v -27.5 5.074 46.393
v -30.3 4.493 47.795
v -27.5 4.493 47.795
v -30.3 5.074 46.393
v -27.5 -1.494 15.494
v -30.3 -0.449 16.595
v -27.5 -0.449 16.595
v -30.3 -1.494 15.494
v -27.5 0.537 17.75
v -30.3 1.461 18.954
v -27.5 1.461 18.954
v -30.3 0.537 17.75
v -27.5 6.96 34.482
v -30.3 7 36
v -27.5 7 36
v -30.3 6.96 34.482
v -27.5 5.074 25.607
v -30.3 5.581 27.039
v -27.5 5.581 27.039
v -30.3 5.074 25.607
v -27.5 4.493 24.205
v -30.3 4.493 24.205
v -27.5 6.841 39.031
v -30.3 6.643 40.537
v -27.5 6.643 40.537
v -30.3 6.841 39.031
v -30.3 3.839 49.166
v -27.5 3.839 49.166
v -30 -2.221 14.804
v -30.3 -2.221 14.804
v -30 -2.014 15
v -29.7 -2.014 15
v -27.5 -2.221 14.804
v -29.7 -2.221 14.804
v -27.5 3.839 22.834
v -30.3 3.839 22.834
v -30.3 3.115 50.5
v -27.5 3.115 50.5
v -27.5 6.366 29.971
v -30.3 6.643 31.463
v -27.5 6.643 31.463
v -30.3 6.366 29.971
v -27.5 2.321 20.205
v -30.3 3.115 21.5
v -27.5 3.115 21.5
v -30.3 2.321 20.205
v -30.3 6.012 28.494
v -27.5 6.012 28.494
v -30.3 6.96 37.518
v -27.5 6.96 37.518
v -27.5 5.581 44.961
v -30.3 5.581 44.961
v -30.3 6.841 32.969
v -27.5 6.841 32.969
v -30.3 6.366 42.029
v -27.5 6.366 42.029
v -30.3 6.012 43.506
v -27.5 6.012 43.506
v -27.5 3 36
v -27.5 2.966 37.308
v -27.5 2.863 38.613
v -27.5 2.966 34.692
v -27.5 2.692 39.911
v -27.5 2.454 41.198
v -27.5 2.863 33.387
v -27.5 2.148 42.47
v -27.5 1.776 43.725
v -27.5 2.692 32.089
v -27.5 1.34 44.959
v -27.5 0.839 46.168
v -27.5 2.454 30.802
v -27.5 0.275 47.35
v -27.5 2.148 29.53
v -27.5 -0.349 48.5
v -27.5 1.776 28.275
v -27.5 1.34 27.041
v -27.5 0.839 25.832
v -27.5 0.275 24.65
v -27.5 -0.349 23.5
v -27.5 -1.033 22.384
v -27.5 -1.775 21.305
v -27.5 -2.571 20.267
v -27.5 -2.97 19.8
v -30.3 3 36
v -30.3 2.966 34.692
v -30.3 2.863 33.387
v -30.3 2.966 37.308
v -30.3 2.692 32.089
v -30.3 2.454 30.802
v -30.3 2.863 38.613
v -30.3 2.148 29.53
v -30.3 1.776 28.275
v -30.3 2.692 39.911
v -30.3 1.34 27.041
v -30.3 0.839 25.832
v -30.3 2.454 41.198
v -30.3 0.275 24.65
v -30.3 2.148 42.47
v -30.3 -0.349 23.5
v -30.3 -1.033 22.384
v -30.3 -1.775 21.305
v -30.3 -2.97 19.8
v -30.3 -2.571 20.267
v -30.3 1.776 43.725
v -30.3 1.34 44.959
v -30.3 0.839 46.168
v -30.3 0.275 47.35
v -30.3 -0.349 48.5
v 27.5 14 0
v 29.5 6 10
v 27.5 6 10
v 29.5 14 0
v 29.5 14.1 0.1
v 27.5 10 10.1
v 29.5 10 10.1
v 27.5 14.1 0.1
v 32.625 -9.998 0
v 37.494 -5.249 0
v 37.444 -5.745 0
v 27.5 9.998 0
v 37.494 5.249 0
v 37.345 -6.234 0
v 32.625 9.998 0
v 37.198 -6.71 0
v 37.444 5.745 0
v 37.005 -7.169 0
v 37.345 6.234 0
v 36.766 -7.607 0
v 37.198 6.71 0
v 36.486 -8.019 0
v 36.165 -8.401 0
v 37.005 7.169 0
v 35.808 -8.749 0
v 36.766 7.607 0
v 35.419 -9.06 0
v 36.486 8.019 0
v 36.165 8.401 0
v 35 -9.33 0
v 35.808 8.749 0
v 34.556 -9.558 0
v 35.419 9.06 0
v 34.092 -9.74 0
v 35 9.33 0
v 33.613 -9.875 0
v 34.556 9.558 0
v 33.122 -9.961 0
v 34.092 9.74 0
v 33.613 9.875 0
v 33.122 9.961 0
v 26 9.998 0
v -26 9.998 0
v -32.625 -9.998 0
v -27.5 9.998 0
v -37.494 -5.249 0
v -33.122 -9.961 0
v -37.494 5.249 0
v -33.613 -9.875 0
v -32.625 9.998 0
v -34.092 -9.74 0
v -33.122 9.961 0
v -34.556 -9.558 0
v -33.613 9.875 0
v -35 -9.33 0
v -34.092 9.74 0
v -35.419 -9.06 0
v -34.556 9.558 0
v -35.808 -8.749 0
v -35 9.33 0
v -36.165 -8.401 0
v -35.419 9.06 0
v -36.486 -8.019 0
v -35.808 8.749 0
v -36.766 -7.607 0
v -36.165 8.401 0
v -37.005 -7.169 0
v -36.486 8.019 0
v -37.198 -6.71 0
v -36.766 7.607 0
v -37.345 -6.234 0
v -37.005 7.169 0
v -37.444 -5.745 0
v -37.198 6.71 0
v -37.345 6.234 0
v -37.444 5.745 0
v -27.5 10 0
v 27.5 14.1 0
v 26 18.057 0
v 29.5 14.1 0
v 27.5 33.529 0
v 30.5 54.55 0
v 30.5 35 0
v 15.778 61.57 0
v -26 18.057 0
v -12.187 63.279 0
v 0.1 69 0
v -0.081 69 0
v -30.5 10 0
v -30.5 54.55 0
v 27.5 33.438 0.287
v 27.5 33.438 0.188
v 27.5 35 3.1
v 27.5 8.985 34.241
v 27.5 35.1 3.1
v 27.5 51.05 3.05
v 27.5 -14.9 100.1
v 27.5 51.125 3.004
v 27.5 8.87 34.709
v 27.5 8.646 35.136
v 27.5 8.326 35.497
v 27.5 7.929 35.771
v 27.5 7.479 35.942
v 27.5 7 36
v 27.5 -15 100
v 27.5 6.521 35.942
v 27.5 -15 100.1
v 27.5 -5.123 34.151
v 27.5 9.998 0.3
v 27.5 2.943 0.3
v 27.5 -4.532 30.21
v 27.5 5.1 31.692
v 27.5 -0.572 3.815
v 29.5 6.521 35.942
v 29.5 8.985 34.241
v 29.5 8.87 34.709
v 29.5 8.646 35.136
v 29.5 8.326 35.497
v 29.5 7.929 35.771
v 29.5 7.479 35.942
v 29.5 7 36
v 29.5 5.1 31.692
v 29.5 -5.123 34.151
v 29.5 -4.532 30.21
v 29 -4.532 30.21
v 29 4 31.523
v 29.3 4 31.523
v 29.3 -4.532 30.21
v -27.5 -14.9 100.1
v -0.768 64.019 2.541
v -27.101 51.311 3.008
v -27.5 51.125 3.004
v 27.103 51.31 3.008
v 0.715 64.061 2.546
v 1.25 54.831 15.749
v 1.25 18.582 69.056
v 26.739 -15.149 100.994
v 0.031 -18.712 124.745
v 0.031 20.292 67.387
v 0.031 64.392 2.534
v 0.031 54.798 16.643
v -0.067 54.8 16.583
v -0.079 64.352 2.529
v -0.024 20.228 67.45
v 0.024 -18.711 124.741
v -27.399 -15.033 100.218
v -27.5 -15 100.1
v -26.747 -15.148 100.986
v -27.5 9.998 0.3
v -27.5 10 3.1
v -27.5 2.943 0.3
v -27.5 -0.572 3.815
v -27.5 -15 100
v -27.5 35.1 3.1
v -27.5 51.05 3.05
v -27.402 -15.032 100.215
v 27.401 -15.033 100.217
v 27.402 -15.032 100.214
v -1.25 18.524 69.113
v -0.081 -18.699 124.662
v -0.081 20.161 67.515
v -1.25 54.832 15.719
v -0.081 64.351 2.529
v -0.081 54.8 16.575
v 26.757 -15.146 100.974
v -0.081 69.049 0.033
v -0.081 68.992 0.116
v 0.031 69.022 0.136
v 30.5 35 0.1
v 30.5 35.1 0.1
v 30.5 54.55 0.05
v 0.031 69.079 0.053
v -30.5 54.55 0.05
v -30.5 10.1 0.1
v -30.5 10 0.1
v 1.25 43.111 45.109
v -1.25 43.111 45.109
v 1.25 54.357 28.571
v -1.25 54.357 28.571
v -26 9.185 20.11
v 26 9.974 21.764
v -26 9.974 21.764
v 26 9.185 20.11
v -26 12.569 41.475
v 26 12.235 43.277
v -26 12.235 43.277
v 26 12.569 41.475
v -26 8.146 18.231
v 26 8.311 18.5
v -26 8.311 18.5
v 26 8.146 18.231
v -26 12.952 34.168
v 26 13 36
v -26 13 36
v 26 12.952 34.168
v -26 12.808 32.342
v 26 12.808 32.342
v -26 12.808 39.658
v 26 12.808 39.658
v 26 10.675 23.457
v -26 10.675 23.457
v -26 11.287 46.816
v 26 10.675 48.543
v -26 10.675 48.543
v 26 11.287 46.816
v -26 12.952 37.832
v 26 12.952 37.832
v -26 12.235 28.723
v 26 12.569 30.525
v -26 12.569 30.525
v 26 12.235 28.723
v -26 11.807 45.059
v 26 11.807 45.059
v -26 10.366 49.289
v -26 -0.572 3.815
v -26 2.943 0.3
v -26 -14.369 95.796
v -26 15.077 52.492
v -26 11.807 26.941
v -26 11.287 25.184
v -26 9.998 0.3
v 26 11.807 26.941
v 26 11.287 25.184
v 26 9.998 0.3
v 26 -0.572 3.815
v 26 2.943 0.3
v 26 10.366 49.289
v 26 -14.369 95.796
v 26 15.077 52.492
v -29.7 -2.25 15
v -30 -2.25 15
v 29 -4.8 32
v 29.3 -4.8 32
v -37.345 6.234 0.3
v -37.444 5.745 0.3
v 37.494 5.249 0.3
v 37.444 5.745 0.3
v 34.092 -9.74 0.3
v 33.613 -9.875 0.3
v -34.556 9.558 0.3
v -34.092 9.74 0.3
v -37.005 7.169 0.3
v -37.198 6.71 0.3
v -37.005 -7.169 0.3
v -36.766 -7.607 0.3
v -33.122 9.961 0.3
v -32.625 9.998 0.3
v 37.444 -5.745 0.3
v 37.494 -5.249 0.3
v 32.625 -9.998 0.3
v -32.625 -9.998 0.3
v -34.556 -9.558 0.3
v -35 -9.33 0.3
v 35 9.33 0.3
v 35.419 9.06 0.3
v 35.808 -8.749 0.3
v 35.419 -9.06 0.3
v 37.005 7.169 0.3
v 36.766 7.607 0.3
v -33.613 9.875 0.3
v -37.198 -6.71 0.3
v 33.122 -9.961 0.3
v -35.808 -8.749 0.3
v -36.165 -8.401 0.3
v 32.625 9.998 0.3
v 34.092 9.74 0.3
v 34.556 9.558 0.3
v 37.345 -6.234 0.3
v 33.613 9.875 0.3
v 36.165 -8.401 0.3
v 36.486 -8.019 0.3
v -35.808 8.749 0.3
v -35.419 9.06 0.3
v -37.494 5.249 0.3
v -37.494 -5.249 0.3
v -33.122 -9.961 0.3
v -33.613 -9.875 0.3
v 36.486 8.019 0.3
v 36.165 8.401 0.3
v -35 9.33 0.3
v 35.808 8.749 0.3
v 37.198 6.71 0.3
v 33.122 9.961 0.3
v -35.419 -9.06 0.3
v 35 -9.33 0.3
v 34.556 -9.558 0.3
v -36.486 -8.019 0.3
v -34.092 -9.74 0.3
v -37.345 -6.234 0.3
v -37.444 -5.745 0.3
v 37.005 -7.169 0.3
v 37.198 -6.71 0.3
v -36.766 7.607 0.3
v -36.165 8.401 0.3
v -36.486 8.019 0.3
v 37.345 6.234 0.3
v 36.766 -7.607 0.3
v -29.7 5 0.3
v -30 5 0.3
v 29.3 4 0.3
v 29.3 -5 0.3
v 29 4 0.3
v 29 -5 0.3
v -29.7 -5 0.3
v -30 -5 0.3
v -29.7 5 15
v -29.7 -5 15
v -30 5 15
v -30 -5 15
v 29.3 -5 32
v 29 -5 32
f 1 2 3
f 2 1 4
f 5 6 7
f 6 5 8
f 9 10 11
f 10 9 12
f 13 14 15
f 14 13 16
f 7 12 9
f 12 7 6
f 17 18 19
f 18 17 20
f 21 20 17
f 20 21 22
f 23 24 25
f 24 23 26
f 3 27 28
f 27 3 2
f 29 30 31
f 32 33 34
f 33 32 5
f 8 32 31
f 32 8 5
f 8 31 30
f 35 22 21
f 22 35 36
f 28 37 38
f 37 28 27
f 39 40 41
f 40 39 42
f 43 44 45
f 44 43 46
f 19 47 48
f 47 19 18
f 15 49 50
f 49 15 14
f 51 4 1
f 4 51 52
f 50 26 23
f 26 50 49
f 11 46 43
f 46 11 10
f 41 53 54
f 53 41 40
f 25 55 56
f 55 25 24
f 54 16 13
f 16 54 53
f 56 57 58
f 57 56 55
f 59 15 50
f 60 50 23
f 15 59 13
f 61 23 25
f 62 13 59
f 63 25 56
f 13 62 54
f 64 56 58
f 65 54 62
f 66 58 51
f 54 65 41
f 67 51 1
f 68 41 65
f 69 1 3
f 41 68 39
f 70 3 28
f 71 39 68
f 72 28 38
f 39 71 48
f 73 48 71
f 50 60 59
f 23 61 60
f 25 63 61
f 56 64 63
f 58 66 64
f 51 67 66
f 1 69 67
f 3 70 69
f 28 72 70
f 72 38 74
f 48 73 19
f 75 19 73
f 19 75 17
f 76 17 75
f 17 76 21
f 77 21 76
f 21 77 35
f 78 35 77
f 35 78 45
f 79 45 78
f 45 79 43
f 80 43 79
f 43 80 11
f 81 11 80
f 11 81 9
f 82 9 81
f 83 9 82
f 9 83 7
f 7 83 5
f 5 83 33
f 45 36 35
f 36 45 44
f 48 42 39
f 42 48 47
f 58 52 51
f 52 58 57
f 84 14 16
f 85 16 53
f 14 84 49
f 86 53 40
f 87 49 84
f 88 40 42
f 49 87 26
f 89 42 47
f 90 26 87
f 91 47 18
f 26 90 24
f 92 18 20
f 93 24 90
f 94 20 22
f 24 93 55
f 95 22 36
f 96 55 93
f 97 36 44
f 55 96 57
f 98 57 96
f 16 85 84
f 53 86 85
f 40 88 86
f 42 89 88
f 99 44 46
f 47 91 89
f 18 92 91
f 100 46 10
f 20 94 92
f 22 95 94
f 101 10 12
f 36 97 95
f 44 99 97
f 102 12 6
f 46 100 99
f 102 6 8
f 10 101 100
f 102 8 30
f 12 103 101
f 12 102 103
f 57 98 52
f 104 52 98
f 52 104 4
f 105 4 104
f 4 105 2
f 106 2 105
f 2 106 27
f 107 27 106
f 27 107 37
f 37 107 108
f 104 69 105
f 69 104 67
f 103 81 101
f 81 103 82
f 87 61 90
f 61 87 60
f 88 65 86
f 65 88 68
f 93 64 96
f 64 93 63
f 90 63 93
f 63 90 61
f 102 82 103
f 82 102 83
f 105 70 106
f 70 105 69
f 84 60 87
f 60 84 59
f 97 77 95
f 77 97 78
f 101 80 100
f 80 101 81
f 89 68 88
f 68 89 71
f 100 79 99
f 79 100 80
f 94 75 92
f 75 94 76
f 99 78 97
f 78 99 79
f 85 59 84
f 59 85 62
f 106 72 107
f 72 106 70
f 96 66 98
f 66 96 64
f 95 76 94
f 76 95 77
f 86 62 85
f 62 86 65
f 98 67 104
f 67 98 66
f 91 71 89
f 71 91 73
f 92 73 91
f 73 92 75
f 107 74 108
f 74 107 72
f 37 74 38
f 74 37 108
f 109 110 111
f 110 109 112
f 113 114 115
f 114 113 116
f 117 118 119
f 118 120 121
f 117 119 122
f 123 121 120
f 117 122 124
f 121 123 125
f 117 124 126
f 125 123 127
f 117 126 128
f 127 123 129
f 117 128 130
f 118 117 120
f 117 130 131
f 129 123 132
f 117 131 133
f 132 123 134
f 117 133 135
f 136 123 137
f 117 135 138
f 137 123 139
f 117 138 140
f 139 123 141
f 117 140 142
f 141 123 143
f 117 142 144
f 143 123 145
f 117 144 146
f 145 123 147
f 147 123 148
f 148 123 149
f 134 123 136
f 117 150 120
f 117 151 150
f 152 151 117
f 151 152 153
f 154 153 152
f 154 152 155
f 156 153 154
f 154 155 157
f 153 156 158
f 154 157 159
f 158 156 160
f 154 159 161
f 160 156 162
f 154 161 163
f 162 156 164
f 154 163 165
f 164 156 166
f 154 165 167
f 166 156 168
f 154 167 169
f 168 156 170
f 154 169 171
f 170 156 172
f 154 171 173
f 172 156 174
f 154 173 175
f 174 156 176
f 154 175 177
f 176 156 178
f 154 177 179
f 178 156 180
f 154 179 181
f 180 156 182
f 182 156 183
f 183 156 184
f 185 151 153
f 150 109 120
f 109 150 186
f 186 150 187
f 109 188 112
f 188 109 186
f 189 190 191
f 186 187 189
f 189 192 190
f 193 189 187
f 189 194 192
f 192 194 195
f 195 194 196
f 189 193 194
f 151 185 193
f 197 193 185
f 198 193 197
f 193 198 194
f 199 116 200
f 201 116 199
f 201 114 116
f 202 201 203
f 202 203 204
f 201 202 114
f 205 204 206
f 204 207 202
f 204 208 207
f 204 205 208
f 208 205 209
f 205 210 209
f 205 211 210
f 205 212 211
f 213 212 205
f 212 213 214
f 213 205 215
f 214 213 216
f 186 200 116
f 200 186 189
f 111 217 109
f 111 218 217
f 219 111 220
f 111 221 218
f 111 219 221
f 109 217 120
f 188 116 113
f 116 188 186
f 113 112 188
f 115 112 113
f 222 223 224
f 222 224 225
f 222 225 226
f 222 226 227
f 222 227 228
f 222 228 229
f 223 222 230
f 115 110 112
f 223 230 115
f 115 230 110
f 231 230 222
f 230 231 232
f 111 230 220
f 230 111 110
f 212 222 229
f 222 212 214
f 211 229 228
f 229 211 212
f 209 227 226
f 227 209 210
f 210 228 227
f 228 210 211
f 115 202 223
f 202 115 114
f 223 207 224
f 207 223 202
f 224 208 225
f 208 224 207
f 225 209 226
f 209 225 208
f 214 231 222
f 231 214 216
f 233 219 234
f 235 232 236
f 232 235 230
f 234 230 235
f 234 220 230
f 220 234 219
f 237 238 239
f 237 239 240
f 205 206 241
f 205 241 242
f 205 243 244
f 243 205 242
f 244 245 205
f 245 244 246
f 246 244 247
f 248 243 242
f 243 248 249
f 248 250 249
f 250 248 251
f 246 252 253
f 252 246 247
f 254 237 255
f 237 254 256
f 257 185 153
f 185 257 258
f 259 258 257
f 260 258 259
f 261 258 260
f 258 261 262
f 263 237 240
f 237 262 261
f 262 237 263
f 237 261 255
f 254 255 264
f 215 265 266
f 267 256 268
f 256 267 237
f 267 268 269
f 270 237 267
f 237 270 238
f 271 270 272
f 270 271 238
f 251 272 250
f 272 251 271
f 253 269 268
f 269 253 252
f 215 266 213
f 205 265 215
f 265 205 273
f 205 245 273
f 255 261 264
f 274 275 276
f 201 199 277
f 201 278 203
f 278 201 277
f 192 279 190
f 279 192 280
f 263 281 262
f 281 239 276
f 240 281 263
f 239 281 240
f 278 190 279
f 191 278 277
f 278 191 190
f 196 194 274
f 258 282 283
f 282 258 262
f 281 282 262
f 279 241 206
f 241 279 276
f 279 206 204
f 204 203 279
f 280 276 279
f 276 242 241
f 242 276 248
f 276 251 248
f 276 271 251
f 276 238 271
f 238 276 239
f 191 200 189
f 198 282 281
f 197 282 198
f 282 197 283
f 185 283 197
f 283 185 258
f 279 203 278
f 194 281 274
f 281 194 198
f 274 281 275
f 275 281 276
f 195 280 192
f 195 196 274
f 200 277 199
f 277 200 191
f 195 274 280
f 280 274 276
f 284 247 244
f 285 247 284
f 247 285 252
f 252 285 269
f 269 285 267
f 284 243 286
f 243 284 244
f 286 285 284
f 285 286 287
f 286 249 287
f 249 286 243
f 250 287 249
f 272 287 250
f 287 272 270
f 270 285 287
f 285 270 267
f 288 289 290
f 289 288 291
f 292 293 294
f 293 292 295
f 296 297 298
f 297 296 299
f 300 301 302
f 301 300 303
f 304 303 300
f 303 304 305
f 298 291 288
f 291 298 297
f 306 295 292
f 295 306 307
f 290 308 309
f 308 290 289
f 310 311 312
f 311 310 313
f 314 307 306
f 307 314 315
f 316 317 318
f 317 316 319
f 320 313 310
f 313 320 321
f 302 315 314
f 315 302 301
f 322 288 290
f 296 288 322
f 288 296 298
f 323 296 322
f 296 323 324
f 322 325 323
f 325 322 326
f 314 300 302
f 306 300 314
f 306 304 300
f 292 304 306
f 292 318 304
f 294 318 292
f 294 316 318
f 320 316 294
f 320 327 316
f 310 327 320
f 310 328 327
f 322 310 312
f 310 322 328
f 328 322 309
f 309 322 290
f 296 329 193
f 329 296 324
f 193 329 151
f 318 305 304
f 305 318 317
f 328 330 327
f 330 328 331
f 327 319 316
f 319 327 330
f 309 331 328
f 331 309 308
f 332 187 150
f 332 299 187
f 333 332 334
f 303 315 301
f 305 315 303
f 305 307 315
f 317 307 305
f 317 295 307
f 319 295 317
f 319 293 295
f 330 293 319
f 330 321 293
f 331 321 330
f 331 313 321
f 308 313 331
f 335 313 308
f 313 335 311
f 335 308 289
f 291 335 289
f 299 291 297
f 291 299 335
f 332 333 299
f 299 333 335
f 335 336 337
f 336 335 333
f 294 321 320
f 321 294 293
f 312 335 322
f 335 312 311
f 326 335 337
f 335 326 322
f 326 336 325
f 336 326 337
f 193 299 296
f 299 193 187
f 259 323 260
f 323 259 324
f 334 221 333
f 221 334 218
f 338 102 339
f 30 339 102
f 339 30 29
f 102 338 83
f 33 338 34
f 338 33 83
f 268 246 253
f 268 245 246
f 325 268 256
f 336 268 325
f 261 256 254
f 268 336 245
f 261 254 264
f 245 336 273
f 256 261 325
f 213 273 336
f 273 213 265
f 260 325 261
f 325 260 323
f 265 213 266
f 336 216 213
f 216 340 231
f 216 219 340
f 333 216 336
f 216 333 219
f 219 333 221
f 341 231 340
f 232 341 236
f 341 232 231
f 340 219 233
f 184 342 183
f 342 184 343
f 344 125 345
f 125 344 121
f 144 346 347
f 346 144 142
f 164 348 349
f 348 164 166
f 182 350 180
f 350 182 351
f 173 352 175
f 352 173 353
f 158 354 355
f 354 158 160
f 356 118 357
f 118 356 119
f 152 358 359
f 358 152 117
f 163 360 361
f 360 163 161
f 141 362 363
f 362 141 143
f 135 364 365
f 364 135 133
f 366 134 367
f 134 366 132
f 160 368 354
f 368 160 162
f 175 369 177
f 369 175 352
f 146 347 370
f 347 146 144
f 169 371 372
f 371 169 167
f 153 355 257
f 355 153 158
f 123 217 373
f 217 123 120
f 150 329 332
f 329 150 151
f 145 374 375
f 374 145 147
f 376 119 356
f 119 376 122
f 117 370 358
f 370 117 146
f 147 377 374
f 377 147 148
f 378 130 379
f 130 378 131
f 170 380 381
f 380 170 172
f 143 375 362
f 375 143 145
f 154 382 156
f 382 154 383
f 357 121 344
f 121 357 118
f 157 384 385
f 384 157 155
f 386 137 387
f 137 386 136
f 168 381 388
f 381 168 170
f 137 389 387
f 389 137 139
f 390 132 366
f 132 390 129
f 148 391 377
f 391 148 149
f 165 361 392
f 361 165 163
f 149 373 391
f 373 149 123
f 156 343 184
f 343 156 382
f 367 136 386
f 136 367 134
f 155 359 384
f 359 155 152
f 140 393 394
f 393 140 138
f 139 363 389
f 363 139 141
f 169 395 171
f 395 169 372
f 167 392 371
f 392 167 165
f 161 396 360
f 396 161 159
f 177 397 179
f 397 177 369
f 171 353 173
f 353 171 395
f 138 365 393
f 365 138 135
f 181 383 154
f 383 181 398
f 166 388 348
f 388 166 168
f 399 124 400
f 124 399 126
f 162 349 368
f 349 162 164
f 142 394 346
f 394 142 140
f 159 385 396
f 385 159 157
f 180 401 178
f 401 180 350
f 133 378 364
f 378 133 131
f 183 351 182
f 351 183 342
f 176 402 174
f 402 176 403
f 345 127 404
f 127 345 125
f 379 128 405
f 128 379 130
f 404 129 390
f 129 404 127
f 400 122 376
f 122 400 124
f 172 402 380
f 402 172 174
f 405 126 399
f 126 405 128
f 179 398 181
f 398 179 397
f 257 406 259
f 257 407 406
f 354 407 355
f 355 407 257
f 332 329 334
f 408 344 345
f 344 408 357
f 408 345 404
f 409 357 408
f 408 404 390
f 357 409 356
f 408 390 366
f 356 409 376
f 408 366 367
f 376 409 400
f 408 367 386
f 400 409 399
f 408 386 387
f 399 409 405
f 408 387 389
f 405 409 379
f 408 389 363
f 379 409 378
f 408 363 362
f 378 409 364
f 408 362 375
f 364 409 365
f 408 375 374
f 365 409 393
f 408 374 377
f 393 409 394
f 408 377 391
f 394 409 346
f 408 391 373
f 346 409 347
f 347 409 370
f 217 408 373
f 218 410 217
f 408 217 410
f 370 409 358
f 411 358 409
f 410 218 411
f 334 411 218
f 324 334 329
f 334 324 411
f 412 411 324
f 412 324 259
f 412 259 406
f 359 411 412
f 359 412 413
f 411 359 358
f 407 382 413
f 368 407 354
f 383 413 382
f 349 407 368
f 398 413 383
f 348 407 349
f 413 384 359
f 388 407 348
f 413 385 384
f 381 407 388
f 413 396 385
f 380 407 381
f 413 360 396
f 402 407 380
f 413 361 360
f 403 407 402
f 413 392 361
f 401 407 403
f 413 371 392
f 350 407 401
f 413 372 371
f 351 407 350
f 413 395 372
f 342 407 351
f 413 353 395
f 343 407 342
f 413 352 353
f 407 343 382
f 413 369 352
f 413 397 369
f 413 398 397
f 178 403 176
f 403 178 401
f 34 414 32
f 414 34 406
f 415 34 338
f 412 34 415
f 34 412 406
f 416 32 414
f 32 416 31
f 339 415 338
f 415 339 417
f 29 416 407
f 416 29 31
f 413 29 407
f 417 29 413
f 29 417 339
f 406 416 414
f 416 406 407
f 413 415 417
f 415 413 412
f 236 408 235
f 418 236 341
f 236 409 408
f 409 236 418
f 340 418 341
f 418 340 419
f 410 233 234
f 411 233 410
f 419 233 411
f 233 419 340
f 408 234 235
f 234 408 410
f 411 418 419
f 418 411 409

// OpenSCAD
$fs=$fs/4;
$fa=$fa/4;

lg = 55;
e = 1.5;

x1 = 53;
x1_2 = x1+13;
x2 = -15;
y2 = 100;

angle = atan((x1-x2)/y2);
angle2 = atan(x2/y2);

//echo(angle3);
echo(angle2);

droite_h = 2.8;
module droite(){
    droite_r = 58/2;
    difference(){
        cylinder(r = droite_r, droite_h);
        translate([0, 0,-1]) cylinder(r = droite_r-4, 10);
        
        translate([0, 0,-1])  rotate([0,0,120])cube([200,200,200]);
        //translate([0, -100,-1]) cube([200,200,200]);
    }
}

module gauche(){
    gauche_e = 2;
    gauche_pt1 = [0, 14,0];
    gauche_pt2 = [0, 6,10];
    gauche_pt3 = [0, 7,34];
    gauche_pt4 = [0, -6,32];
    hull(){
        translate(gauche_pt1)  cube([gauche_e,0.1,0.1]);
        translate(gauche_pt2)  cube([gauche_e,4,0.1]);
    }
    
    hull(){
        translate(gauche_pt2)  cube([gauche_e,4,0.1]);
        translate(gauche_pt3) rotate([0,90,0]) cylinder(r=2, gauche_e);
    }
    hull(){
        translate(gauche_pt3) rotate([0,90,0]) cylinder(r=2, gauche_e);
        translate(gauche_pt4) rotate([0,90,0]) cylinder(r=2, gauche_e);
    }
}

canelure_pt = [0,-22,36];
canelure_r = 68/2;

e2=2.5;

e_bas = 3;
module capot_vader(){
    difference(){
        union(){
            hull(){
                translate([-lg/2, 0,0]) cube([lg,0.1,0.1]);
                translate([-lg/2, x2,y2]) cube([lg,0.1,0.1]);
                
                translate([-lg/2, x1,0]) cube([lg,0.1,0.1]);
                
                translate([0, x1_2,0]) rotate([angle,0,0])  cylinder(r=0.1, 160);
            }
            
            
            hull(){
                translate([-lg/2-e_bas, 10,0]) cube([10,0.1,0.1]);
                translate([-lg/2, 10,e_bas]) cube([10,0.1,0.1]);
                
                translate([-lg/2, 35,0]) cube([lg+e_bas,0.1,0.1]);
                translate([-lg/2, 35,e_bas]) cube([lg,0.1,0.1]);
                
                translate([0, x1+e_bas/2,0]) cube([lg+2*e_bas,0.1,0.1], center = true);
                translate([0, x1_2+e_bas,0]) rotate([angle,0,0])  cylinder(r=0.1, 0.1);
                
                translate([0, x1-2,e_bas]) cube([lg,0.1,0.1], center = true);
                translate([0, x1_2,0]) rotate([angle,0,0])  cylinder(r=0.1, e_bas);
            }
            
            translate([-e2/2, x1_2,-1]) rotate([angle,0,0]) translate([0,0,20]) hull(){
                cube([e2,0.1,65]);
                translate([0, 0,11]) cube([e2,7,20]);
            }
            
            translate([-lg/2-droite_h,0,0]) translate(canelure_pt)  rotate([0,90,0]) droite();
            translate([lg/2, 0,0]) gauche();
            %translate([-lg, 0 ,49]) cube([lg,1,1]);;
            
        }
        
        %translate(canelure_pt) rotate([0,90,0]) cylinder(r=canelure_r,34, center=true);
        translate(canelure_pt) rotate([0,90,0]) cylinder(r=canelure_r+1,lg-2*e, center=true);
        translate([-lg/2+e, -18,30]) rotate([angle,0,0]) cube([lg-2*e,40,100]);
        translate([-lg/2+e, 8,-15]) rotate([-angle2+20,0,0]) cube([lg-2*e,16,30]);
        translate([0, -1,0]) rotate([45,0,0]) cube([lg+2,6,6], center=true);
        
        translate([-100, 0,-10]) cube([200,200,10]);
        
        rotate([-angle2,0,0]) translate([-100, -100,0])cube([200,100,200]);
            
    }

    e_support = 0.3;
    hull(){
        for(i=[0,1]){
            for(j=[0,1]){
                mirror([i,0])  mirror([0,j]) translate([-lg/2-5, -5,0]) cylinder(r=5, e_support);
            }
        }
    }

    translate([-lg/2-2.5, -5,0]) cube([e_support, 10,15]);
    translate([lg/2+1.5, -5,0]) cube([e_support, 9,32]);
}

capot_vader();
